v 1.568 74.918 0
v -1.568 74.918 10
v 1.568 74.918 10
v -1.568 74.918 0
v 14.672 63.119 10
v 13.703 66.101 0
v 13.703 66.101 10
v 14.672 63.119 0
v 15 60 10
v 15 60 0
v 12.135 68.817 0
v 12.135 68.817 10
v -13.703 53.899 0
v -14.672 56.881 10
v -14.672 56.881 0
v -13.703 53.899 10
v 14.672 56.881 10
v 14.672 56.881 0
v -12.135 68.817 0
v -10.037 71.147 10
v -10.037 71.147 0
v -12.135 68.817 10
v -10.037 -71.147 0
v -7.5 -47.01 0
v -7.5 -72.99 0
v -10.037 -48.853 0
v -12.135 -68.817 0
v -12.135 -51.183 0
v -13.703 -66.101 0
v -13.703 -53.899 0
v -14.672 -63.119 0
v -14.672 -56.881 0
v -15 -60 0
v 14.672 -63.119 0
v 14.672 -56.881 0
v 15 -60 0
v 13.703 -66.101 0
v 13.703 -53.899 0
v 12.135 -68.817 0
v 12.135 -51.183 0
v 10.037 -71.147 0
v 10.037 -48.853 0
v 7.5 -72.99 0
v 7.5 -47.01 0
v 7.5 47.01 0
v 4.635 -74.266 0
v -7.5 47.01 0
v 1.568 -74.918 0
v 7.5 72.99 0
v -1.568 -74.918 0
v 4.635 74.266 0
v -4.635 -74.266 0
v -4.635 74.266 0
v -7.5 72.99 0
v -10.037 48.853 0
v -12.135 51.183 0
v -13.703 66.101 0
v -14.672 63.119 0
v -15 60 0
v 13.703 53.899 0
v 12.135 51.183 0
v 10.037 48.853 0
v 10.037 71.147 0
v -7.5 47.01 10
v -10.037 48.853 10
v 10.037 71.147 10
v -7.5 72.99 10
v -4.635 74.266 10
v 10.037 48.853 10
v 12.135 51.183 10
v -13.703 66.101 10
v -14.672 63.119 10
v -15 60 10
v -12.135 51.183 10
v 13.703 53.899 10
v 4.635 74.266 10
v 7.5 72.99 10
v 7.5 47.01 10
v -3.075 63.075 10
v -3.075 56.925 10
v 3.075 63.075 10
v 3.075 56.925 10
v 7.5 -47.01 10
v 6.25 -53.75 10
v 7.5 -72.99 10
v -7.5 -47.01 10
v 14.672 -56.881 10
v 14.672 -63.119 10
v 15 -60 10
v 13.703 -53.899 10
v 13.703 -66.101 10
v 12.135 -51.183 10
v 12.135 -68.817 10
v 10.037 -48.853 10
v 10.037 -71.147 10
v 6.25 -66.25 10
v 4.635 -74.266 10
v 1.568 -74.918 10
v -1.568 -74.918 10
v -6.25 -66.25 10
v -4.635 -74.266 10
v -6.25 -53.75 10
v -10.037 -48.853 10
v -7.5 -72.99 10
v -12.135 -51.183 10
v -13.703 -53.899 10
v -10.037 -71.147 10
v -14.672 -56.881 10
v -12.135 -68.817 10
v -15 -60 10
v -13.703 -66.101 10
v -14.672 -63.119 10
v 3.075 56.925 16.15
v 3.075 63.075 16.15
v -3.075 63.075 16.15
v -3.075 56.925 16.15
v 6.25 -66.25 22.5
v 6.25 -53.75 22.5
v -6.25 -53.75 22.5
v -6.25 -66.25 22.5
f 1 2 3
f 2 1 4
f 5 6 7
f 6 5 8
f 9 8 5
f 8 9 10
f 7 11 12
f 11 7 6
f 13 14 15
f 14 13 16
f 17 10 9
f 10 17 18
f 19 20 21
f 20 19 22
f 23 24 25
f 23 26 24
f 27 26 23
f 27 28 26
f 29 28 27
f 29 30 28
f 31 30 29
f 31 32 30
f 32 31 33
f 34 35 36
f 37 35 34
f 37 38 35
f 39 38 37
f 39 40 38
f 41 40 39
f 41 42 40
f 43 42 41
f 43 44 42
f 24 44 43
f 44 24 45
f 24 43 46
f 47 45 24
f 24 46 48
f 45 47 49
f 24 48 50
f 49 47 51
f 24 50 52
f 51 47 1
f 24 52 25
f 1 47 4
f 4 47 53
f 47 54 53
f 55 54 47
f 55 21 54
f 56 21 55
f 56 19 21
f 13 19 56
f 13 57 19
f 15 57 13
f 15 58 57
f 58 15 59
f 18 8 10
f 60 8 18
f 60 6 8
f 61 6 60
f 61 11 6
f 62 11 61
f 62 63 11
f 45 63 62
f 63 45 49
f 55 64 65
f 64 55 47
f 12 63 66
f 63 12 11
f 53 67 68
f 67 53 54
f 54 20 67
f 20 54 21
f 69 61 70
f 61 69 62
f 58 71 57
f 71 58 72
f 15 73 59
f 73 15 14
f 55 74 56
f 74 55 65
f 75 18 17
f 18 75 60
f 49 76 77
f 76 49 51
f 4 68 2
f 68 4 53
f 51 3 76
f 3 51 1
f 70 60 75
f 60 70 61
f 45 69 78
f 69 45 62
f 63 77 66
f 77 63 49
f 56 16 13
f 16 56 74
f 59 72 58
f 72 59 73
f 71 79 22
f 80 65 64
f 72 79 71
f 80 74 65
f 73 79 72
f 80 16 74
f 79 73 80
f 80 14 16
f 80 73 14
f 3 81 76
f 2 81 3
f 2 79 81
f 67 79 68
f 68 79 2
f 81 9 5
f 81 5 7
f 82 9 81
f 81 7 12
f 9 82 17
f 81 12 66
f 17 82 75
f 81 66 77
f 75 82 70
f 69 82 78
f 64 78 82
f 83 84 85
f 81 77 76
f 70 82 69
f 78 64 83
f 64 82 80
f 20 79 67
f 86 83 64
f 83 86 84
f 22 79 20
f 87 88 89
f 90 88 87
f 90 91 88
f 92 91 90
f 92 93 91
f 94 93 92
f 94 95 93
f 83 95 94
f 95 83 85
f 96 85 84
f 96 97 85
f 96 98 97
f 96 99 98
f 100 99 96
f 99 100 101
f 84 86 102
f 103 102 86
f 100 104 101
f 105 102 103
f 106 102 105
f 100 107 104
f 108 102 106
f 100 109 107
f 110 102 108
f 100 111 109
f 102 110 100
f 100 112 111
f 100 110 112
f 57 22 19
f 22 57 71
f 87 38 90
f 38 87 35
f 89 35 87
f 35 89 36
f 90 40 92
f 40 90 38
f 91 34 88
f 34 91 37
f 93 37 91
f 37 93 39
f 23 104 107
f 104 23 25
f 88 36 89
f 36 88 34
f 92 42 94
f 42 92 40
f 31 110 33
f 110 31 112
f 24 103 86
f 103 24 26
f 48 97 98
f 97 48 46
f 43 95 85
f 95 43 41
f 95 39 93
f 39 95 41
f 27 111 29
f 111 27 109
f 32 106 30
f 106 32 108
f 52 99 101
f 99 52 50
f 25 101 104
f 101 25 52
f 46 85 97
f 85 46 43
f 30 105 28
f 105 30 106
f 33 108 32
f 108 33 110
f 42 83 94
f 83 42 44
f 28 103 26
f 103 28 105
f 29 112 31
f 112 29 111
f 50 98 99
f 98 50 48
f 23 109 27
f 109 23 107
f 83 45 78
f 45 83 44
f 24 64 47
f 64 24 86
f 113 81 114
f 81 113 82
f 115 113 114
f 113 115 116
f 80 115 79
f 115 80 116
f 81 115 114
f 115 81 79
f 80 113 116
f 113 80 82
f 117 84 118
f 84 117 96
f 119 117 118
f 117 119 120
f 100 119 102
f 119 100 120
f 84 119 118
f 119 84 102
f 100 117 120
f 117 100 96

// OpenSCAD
//Socket wrench (customizable)

/* [Drives] */

// size of drive 1
drive1 = 6.35; // [6.35:1/4", 9.525:3/8", 12.7:1/2", 19.05:3/4", 25.4:1"]
// size of drive 2
drive2 = 12.7; // [6.35:1/4", 9.525:3/8", 12.7:1/2", 19.05:3/4", 25.4:1"]
// drive size tolerance (mm)
tolerance = 0.2;

tolDrive1 = drive1 - tolerance;
tolDrive2 = drive2 - tolerance;

/* [Tool] */

// width of tool (mm)
D = 15;
// MARGIN	
M = D/2; 	
// height (thickness) of tool (mm)
H = 10;
// total length of tool (mm)
Ltot = 150; 	

// Length from Center of One Side to Center of Other Side
L = Ltot-2*(D/2+M);
union()
{
	//Jamesdavid's parametric wrench
	difference() {
		union() {
			translate([0,L/2,H/2]) {
				cylinder(r = (D/2+M), h = H,center = true);
			}
			translate([0,-L/2,H/2]) {
				cylinder(r = (D/2+M), h = H,center = true);
			}
			translate([-1*D/2,-L/2,0]) {
				cube([D,L,H], center=false);
			}
		}
	}
	
	//socket drives
	translate([0, L/2, H+(tolDrive1/2)])
	cube(size = tolDrive1, center = true);

	translate([0, -L/2, H+(tolDrive2/2)])
	cube(size = tolDrive2, center = true);
}
